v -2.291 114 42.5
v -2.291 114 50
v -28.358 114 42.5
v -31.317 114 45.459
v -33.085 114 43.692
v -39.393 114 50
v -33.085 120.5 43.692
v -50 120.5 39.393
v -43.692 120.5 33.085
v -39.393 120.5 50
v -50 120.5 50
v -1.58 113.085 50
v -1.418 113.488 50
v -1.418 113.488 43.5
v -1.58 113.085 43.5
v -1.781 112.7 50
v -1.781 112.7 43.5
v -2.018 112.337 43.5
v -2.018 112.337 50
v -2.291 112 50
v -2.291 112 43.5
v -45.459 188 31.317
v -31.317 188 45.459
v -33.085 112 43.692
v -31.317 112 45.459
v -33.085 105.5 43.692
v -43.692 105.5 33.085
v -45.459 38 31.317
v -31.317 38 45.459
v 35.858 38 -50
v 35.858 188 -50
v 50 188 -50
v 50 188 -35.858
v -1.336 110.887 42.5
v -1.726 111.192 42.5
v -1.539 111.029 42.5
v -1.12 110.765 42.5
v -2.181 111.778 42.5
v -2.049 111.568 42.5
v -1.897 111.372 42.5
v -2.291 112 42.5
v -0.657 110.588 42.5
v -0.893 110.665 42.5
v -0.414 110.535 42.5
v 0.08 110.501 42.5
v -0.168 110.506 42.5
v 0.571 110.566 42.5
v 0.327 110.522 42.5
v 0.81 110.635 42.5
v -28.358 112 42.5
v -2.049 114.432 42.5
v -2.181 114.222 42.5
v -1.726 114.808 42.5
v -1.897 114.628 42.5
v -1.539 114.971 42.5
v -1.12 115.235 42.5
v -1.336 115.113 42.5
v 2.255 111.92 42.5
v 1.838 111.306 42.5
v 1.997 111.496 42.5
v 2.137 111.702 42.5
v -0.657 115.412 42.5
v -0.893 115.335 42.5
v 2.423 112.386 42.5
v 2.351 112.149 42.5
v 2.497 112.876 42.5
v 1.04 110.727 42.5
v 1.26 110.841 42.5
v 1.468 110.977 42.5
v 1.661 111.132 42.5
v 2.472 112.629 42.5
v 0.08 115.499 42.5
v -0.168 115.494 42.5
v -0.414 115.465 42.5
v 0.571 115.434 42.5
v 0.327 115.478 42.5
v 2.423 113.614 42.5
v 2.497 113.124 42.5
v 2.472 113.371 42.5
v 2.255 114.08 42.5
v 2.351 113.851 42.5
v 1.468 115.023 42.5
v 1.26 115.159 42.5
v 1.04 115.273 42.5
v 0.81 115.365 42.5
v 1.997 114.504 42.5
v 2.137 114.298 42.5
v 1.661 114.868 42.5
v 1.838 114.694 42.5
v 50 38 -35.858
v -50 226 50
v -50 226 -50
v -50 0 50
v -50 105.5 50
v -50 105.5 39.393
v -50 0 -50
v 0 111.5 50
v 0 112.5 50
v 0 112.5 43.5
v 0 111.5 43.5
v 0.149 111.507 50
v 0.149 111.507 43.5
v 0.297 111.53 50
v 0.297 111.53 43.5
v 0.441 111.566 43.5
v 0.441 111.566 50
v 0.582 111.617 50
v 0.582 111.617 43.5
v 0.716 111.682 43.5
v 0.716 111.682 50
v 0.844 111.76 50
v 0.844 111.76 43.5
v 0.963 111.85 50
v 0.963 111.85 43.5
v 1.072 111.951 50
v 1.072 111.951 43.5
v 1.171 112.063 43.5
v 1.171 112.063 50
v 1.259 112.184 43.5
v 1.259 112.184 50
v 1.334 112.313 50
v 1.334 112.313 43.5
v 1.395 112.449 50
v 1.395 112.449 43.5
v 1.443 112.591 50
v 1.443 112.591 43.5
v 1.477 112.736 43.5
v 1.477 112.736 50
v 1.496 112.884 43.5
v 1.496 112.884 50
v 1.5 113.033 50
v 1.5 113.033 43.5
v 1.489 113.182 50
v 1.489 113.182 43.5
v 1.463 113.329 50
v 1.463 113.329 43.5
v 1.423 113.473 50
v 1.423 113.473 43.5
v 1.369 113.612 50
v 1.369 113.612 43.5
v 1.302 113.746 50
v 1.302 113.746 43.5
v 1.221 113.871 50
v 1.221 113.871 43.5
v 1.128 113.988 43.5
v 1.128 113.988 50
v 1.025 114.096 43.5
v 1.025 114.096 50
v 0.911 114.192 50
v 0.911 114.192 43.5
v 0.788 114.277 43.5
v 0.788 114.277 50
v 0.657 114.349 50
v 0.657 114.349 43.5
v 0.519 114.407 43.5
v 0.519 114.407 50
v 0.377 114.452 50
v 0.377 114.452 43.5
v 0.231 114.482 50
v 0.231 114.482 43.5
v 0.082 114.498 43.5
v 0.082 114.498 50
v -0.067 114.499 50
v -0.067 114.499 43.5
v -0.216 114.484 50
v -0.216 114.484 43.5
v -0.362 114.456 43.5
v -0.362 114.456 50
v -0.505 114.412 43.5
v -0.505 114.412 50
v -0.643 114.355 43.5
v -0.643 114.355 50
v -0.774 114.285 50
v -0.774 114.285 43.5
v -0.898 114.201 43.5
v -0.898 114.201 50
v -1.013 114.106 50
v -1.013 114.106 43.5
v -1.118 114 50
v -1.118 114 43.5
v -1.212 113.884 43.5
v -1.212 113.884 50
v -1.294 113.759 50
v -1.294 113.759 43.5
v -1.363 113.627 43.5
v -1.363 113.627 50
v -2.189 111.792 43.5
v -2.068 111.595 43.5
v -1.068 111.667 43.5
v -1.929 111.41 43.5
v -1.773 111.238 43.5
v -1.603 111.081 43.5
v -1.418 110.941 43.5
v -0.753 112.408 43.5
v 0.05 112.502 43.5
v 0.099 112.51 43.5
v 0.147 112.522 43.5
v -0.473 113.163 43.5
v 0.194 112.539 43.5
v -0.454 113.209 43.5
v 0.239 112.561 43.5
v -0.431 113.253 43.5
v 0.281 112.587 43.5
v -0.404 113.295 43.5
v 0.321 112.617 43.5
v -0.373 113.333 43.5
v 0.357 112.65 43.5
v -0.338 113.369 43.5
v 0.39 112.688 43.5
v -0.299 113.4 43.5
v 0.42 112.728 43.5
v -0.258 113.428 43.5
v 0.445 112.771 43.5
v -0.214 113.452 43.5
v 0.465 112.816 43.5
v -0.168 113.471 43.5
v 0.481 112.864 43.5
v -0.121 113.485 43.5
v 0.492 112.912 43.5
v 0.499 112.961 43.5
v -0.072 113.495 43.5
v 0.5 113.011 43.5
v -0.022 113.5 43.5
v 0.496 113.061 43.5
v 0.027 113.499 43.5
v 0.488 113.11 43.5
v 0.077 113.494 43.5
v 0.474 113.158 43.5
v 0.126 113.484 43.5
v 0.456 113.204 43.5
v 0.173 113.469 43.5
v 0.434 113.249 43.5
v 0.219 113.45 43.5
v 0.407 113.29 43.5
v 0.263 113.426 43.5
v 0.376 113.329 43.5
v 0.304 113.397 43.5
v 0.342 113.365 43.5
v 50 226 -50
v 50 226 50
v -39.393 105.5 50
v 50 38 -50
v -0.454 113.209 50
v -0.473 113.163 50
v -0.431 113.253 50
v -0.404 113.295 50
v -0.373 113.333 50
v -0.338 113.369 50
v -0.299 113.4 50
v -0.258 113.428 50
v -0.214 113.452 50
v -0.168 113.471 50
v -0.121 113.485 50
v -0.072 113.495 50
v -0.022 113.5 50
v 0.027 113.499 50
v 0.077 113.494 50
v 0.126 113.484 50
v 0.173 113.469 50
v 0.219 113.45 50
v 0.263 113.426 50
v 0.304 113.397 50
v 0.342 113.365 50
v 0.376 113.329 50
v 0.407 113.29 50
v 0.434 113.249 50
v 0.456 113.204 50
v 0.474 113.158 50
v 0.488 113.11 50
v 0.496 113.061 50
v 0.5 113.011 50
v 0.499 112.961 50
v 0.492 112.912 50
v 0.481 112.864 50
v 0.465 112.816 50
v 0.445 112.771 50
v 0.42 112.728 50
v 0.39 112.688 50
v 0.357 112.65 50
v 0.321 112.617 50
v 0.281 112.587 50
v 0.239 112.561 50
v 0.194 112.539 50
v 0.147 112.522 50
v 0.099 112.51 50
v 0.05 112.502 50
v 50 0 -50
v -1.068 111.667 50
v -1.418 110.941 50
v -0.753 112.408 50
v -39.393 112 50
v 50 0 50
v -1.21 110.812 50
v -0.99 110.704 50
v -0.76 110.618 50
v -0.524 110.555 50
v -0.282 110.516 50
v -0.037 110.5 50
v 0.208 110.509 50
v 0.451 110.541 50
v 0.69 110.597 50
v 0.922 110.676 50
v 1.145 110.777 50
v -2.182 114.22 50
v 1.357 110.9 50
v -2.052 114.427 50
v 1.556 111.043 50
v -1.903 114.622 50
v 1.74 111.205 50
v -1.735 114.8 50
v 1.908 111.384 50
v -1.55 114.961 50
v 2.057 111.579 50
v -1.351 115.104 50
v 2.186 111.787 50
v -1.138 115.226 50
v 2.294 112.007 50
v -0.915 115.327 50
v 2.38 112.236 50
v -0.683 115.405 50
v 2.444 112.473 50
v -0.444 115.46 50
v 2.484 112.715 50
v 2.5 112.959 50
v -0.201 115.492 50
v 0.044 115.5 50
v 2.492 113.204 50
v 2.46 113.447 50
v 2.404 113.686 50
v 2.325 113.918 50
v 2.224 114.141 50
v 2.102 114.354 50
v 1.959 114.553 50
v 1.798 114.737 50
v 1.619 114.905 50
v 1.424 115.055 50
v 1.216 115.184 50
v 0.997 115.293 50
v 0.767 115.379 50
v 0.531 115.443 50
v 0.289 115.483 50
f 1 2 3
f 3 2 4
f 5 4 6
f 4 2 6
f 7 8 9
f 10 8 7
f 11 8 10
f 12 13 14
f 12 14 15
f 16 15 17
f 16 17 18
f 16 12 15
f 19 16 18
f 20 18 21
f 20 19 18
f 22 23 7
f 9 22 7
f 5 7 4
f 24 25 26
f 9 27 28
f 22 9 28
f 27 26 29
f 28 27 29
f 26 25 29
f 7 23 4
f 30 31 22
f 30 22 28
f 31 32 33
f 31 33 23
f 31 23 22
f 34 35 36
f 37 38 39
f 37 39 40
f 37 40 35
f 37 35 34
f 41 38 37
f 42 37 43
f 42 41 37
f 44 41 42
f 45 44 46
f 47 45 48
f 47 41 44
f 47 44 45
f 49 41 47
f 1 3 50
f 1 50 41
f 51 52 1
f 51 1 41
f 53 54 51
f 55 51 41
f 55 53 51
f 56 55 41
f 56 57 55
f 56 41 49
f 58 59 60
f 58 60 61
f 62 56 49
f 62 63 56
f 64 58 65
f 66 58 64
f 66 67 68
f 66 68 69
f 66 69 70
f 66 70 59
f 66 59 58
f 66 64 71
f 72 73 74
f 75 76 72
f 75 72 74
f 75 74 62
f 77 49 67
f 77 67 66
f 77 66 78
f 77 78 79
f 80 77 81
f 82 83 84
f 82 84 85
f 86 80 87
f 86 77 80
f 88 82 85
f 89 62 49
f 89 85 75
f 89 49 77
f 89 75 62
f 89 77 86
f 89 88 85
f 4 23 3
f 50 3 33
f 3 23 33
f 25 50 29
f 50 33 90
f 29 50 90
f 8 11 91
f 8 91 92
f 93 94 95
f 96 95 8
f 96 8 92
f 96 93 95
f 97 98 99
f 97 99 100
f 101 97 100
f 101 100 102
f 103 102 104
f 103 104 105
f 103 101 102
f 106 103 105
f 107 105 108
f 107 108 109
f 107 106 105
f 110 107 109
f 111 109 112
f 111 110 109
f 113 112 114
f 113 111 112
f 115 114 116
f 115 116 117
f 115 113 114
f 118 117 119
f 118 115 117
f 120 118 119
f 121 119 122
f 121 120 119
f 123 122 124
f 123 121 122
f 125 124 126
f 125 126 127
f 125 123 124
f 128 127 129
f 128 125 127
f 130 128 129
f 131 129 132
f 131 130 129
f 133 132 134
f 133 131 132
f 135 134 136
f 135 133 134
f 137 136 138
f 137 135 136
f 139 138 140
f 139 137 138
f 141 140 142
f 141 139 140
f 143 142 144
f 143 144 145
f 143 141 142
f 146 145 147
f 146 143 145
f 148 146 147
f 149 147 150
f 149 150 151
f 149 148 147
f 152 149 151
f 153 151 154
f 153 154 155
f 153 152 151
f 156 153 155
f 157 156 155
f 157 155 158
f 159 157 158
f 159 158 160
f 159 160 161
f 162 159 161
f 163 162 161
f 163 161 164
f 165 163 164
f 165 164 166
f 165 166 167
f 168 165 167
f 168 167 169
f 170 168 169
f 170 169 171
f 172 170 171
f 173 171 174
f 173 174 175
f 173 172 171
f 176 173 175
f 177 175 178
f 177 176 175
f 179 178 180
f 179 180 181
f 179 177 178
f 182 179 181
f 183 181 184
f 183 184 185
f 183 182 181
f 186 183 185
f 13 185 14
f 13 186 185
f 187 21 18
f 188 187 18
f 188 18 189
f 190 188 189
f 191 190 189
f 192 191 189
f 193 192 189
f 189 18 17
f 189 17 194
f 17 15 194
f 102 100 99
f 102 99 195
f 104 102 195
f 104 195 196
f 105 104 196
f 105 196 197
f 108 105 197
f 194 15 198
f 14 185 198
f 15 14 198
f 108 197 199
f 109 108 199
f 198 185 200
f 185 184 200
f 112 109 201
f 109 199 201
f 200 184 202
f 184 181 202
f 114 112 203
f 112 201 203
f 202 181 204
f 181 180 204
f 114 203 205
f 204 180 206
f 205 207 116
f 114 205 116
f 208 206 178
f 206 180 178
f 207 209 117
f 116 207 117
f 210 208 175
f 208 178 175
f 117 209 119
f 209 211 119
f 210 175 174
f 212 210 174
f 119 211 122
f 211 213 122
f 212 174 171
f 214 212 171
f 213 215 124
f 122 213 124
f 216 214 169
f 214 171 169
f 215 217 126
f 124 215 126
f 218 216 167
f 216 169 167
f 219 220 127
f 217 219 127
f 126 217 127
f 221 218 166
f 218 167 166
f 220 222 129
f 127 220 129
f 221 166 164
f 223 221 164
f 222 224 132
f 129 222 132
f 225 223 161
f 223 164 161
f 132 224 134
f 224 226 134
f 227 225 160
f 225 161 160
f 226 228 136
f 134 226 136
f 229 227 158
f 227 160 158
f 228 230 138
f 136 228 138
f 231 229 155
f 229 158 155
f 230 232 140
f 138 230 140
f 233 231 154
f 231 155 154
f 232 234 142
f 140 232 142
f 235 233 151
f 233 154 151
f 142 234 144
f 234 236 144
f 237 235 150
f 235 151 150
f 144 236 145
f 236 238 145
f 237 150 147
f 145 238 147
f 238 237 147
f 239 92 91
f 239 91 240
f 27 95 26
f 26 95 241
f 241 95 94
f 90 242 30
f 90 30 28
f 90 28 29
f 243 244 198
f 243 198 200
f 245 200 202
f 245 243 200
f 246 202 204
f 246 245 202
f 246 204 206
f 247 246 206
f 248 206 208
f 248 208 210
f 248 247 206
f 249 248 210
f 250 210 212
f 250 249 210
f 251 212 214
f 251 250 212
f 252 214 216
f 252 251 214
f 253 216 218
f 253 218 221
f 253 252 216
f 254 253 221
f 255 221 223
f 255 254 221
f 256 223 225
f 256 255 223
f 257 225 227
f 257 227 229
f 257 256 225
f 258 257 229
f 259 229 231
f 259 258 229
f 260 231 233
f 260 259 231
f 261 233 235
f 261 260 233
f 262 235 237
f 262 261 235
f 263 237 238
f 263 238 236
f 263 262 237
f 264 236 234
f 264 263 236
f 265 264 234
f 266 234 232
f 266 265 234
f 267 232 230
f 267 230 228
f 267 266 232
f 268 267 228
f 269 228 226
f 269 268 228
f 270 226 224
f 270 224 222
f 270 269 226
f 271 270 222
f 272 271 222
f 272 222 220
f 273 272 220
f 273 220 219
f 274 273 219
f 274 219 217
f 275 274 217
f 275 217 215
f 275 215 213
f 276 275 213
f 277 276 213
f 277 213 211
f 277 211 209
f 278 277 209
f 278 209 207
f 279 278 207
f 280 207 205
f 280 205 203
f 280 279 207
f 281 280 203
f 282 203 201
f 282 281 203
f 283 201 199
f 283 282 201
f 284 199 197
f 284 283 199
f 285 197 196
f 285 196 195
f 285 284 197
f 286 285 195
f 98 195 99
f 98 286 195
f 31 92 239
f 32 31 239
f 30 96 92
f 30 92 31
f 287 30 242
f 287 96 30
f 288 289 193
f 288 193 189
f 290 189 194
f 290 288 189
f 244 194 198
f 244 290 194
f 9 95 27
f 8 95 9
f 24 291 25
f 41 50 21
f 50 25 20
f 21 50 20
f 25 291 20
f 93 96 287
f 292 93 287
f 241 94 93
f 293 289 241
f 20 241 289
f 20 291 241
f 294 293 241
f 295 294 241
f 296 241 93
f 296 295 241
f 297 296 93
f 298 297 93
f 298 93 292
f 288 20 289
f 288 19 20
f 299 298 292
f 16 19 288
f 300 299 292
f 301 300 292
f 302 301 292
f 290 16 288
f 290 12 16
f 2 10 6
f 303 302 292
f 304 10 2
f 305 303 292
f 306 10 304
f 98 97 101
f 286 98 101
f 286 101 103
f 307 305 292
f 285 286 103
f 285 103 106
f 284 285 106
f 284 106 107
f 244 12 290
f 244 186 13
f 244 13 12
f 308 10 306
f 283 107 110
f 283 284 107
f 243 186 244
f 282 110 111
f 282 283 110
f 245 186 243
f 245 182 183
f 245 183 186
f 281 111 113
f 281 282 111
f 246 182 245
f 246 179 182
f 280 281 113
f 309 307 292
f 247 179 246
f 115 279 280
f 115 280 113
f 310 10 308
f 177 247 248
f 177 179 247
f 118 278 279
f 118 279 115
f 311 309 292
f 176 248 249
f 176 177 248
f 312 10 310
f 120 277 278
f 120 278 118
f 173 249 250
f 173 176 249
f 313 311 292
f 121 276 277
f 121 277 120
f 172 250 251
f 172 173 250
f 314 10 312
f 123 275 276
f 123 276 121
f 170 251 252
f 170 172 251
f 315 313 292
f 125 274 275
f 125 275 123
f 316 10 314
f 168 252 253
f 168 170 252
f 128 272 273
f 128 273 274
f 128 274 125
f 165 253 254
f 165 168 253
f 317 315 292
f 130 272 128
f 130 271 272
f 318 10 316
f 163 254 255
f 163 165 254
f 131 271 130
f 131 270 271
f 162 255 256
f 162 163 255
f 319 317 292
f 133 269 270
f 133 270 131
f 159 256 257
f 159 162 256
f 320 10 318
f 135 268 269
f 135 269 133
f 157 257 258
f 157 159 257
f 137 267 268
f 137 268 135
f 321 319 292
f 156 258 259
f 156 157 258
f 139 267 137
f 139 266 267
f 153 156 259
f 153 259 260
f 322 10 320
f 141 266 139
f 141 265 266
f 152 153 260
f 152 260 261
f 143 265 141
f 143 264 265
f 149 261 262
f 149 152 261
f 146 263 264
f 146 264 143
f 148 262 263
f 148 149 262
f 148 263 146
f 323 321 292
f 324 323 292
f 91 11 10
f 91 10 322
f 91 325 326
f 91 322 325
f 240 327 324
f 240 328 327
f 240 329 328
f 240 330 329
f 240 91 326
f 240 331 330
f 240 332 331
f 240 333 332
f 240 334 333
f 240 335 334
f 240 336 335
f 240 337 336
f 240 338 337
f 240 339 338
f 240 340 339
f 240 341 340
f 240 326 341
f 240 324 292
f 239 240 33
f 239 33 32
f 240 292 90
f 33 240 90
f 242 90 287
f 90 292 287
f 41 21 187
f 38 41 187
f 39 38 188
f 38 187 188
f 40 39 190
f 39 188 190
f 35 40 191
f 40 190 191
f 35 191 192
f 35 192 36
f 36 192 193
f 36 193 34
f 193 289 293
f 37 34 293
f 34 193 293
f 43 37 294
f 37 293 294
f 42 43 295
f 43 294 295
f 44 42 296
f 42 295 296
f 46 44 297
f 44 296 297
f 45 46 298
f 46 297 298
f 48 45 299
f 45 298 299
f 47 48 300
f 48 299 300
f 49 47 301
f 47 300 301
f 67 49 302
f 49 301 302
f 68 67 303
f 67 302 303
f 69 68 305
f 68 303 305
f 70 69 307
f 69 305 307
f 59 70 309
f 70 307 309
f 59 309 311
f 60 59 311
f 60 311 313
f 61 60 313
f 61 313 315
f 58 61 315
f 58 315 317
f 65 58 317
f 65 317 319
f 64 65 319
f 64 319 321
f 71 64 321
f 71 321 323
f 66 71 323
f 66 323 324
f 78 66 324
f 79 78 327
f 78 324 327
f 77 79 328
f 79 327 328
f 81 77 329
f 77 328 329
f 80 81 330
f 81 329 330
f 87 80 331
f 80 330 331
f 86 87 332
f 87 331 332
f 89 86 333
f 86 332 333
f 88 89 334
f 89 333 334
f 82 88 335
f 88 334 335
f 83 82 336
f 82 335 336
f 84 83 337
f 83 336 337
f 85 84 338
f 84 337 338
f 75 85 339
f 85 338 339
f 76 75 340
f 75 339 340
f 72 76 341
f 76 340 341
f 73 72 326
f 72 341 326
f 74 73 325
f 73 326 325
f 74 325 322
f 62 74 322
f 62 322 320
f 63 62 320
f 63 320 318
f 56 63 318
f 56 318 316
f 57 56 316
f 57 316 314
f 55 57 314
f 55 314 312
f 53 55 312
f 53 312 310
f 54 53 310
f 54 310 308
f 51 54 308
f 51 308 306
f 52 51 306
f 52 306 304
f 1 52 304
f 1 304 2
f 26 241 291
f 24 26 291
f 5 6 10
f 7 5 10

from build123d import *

# Parameters (mm, degrees)
SKETCH1_W           = 100
SKETCH1_H           = 100
BOSS_EXTRUDE1_DEPTH = 226
SKETCH5_W           = 150
SKETCH5_H           = 10
CUT_EXTRUDE2_DEPTH  = 125
SKETCH6_W           = 15
SKETCH6_H           = 15
CUT_EXTRUDE3_DEPTH  = 125
CUT_EXTRUDE6_DEPTH  = 7.5
BOSS_EXTRUDE2_DEPTH = 6.5


with BuildPart() as part:
    # Sketch1 → Boss-Extrude1 (new body)
    with BuildSketch(Plane(origin=(0, 0, 0), x_dir=(1, 0, 0), z_dir=(0, 1, 0))):
        Rectangle(SKETCH1_W, SKETCH1_H)
    extrude(amount=BOSS_EXTRUDE1_DEPTH)

    # Sketch5 → Cut-Extrude2 (cut)
    with BuildSketch(Plane(origin=(50, 0, -50), x_dir=(0, -1, 0), z_dir=(-0.707106781, 0, 0.707106781))):
        with Locations((-113, -5)):
            Rectangle(SKETCH5_W, SKETCH5_H)
        with Locations((-113, 5)):
            Rectangle(SKETCH5_W, SKETCH5_H)
    extrude(amount=CUT_EXTRUDE2_DEPTH, mode=Mode.SUBTRACT)

    # Sketch6 → Cut-Extrude3 (cut)
    with BuildSketch(Plane(origin=(-50, 0, 50), x_dir=(0.707106781, 0, 0.707106781), z_dir=(-0.707106781, 0, 0.707106781))):
        with Locations((0, 113)):
            Rectangle(SKETCH6_W, SKETCH6_H)
    extrude(amount=-CUT_EXTRUDE3_DEPTH, mode=Mode.SUBTRACT)

    # Sketch8 → Cut-Extrude6 (cut)
    with BuildSketch(Plane.XY.offset(50)):
        with BuildLine():
            Line((-39.393398282, 114), (-39.393398282, 112))
            Line((-39.393398282, 112), (-5, 112))
            Line((-5, 112), (-2.291287847, 112))
            ThreePointArc((-2.291287847, 112), (2.5, 113), (-2.291287847, 114))
            Line((-2.291287847, 114), (-5, 114))
            Line((-5, 114), (-39.393398282, 114))
        make_face()
    extrude(amount=-CUT_EXTRUDE6_DEPTH, mode=Mode.SUBTRACT)

    # Sketch10 → Boss-Extrude2 (add)
    with BuildSketch(Plane.XY.offset(50)):
        with BuildLine():
            ThreePointArc((-0.472805429, 113.162650012), (0.407016588, 113.290409189), (0, 112.5))
            Line((0, 112.5), (0, 111.5))
            ThreePointArc((0, 111.5), (1.221049764, 113.871227567), (-1.418416287, 113.487950036))
            ThreePointArc((-1.418416287, 113.487950036), (-1.780506402, 112.700361849), (-2.291287847, 112))
            ThreePointArc((-2.291287847, 112), (-1.928903385, 111.409612711), (-1.418416287, 110.941336541))
            ThreePointArc((-1.418416287, 110.941336541), (-0.906091719, 112.03517002), (-0.472805429, 113.162650012))
        make_face()
    extrude(amount=-BOSS_EXTRUDE2_DEPTH)


solid = part.part
